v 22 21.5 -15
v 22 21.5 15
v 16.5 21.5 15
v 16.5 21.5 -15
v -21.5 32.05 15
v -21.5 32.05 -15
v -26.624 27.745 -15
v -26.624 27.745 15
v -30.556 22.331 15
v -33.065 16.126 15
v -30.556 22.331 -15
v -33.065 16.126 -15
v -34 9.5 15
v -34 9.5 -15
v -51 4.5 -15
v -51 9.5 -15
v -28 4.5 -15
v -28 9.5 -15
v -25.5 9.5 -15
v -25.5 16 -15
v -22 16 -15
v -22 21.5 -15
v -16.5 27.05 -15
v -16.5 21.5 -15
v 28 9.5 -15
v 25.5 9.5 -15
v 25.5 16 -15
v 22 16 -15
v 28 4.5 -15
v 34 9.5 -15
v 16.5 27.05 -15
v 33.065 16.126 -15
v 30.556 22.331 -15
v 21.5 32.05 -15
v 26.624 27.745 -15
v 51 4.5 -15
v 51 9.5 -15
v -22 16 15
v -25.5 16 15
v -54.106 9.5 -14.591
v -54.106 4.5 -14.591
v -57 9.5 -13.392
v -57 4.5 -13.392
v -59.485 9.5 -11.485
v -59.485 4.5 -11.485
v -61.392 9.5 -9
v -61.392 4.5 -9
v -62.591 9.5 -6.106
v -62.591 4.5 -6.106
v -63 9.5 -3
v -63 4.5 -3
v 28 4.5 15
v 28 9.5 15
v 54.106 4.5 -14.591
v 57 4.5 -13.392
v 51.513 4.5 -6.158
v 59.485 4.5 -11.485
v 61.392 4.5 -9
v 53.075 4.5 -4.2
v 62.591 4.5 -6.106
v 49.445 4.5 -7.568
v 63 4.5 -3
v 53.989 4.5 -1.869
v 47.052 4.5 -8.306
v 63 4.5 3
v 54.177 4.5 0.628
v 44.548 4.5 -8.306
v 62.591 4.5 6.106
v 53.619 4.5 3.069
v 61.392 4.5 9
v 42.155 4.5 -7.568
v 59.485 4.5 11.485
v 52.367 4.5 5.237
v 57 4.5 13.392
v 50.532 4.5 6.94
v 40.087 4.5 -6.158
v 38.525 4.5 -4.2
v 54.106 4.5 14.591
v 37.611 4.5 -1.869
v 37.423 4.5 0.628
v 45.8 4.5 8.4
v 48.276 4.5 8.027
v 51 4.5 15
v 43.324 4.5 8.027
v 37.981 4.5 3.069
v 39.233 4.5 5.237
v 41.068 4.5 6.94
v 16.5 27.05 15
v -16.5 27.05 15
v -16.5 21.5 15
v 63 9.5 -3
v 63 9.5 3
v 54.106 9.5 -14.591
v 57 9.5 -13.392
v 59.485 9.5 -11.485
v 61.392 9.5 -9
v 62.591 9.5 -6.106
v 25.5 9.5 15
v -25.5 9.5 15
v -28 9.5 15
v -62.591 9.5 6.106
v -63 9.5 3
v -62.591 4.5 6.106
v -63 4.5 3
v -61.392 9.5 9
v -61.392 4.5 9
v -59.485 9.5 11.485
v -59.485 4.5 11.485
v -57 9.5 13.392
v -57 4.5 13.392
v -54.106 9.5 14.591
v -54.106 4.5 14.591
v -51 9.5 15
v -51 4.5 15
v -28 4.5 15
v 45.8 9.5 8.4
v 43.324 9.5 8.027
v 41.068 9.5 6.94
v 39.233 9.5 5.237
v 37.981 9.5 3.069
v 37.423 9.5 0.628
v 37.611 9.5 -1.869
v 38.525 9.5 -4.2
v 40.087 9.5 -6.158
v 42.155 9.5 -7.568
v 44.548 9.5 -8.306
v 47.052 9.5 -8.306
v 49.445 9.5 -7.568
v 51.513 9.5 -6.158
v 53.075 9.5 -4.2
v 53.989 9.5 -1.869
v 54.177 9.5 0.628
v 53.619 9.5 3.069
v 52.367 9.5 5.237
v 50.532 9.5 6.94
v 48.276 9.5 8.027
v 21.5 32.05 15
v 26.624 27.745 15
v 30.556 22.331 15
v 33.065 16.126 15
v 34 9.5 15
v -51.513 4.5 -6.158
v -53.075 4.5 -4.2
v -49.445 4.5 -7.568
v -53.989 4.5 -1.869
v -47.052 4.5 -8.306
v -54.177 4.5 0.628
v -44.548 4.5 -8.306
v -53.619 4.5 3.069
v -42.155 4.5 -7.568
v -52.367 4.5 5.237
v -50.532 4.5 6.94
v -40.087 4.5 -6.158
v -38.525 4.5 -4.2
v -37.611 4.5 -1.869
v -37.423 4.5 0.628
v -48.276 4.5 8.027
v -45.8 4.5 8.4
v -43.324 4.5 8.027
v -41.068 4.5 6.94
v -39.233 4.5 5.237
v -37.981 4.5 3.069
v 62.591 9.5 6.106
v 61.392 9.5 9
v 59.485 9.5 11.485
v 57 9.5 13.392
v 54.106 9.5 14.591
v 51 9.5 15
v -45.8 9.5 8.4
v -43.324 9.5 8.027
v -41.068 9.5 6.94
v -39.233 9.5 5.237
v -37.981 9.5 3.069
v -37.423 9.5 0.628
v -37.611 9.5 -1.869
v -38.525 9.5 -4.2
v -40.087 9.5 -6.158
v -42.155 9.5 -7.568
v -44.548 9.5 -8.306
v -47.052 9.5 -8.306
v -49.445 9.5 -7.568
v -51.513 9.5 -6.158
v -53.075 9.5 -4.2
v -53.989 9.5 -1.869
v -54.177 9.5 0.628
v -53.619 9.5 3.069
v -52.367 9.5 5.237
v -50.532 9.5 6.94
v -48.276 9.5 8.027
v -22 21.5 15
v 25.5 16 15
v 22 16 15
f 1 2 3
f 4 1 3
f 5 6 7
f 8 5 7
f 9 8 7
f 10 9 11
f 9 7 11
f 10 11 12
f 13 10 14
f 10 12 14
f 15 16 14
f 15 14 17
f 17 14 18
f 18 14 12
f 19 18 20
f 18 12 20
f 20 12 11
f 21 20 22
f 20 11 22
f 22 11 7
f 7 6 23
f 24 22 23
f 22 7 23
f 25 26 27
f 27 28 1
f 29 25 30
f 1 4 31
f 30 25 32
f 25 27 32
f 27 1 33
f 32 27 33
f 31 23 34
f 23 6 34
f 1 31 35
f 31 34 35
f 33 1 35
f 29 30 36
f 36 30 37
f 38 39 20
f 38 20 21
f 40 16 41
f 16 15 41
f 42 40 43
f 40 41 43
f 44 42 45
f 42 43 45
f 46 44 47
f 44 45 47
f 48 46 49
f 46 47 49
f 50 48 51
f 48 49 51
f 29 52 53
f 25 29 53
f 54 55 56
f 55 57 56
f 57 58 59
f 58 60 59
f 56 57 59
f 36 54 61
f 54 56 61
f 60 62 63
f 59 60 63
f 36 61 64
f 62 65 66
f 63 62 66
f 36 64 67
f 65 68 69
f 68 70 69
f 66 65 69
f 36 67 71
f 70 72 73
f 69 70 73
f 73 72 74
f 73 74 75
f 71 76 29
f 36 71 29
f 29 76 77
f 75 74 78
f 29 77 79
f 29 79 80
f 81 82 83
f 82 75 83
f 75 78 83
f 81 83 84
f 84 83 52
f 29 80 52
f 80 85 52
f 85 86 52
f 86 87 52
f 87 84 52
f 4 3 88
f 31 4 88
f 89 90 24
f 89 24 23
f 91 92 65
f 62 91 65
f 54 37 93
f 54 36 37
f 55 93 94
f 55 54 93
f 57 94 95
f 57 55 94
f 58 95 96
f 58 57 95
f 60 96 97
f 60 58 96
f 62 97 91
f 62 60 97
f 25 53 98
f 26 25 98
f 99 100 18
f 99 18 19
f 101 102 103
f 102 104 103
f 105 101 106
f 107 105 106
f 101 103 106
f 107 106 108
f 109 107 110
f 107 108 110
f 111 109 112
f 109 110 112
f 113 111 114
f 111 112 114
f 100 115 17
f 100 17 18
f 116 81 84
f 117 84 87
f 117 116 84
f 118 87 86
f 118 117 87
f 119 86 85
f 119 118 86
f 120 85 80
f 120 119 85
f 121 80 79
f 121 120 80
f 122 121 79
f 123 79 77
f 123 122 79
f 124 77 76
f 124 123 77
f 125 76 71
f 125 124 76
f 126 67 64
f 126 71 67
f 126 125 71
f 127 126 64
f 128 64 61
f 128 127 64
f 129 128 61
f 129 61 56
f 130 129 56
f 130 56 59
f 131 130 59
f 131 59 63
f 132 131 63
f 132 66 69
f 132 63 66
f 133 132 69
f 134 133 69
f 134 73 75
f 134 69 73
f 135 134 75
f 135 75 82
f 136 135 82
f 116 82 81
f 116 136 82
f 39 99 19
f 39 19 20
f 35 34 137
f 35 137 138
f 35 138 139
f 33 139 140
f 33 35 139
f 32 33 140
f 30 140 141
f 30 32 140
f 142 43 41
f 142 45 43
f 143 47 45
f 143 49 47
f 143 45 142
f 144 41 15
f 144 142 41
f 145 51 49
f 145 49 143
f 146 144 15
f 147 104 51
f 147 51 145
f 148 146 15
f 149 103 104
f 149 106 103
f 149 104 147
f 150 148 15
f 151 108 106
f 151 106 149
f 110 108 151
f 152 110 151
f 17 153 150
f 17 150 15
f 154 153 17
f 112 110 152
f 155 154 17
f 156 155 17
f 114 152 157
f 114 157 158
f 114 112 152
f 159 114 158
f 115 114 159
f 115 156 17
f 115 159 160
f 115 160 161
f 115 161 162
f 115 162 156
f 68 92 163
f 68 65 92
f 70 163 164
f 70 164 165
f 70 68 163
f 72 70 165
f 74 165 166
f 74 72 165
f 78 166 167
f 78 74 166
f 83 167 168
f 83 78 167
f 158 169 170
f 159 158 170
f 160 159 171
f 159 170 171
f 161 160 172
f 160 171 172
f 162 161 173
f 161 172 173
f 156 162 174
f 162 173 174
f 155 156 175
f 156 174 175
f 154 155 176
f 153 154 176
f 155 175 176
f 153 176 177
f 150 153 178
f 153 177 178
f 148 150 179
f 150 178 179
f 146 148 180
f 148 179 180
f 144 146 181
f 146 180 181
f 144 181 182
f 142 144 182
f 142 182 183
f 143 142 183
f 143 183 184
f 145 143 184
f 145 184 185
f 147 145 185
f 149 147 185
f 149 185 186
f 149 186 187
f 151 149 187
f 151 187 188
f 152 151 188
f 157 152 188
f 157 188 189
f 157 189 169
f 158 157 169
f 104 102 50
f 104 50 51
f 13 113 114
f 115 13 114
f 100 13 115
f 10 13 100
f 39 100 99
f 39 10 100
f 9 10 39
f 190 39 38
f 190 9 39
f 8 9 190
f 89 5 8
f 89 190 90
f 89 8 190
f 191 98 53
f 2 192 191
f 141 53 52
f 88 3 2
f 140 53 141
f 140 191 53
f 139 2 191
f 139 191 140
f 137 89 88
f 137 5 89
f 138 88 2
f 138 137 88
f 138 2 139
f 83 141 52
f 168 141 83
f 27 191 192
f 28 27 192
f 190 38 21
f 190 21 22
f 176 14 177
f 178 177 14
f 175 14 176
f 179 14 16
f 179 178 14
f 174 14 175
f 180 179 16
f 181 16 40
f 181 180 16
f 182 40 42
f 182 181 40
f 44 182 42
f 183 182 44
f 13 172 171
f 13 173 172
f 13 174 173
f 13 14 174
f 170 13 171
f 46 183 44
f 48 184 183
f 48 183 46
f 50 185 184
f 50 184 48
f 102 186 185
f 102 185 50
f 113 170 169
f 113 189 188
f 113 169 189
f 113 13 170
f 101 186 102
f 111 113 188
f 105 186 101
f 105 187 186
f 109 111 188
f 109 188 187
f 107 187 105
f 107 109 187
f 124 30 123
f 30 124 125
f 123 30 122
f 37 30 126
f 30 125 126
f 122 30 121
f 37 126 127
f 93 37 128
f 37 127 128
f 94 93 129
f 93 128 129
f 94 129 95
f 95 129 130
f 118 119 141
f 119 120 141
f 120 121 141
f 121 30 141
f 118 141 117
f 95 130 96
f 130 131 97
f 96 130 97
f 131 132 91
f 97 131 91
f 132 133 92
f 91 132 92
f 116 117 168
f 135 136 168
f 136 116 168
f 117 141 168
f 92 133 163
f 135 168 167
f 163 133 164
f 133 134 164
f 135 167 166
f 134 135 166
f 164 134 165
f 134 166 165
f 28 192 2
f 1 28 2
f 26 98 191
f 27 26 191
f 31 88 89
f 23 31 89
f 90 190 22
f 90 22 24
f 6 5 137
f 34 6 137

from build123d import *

# Parameters (mm, degrees)
EXTRUDE_THIN1_DEPTH  = 15
SKETCH2_R            = 8.4
CUT_EXTRUDE1_DEPTH   = 69.574794932
FILLET1_R            = 12
FILLET1_OF_MIRROR1_R = 12
BOSS_EXTRUDE1_DEPTH  = 30


with BuildPart() as part:
    # Sketch1 → Extrude-Thin1 (new, symmetric)
    with BuildSketch(Plane.XY):
        Polygon((-63, 4.5), (-28, 4.5), (-28, 9.5), (-25.5, 9.5), (-25.5, 16), (-22, 16), (-22, 21.5), (-16.5, 21.5), (-16.5, 27.05), (0, 27.05), (0, 32.05), (-21.5, 32.05), (-21.5, 26.5), (-27, 26.5), (-27, 21), (-30.5, 21), (-30.5, 14.5), (-33, 14.5), (-33, 9.5), (-63, 9.5), align=None)
    extrude_thin1 = extrude(amount=EXTRUDE_THIN1_DEPTH, both=True)

    # Sketch2 → Cut-Extrude1 (cut, through all)
    with BuildSketch(Plane(origin=(0, 9.5, 0), x_dir=(1, 0, 0), z_dir=(0, 1, 0))):
        with Locations(Location((-45.8, 0, 0), (0, 0, 270))):
            Circle(SKETCH2_R)
    cut_extrude1 = extrude(amount=-CUT_EXTRUDE1_DEPTH, mode=Mode.SUBTRACT)

    # Fillet1
    fillet1_edges = [part.edges().sort_by_distance(p)[0] for p in [
        (-63, 7, -15),
        (-63, 7, 15),
    ]]
    fillet(fillet1_edges, radius=FILLET1_R)

    # Mirror1: Extrude-Thin1, Cut-Extrude1 across plane
    add(extrude_thin1.mirror(Plane(origin=(0, 32.05, 15), x_dir=(0, 0, 1), z_dir=(1, 0, 0))))
    add(cut_extrude1.mirror(Plane(origin=(0, 32.05, 15), x_dir=(0, 0, 1), z_dir=(1, 0, 0))), mode=Mode.SUBTRACT)

    # Fillet1 of Mirror1
    fillet1_of_mirror1_edges = [part.edges().sort_by_distance(p)[0] for p in [
        (63, 7, -15),
        (63, 7, 15),
    ]]
    fillet(fillet1_of_mirror1_edges, radius=FILLET1_OF_MIRROR1_R)

    # Sketch4 → Boss-Extrude1 (add)
    with BuildSketch(Plane(origin=(0, 0, -15), x_dir=(-1, 0, 0), z_dir=(0, 0, -1))):
        with BuildLine():
            Line((-34, 9.5), (-33, 9.5))
            Line((-33, 9.5), (-33, 14.5))
            Line((-33, 14.5), (-30.5, 14.5))
            Line((-30.5, 14.5), (-30.5, 21))
            Line((-30.5, 21), (-27, 21))
            Line((-27, 21), (-27, 26.5))
            Line((-27, 26.5), (-21.5, 26.5))
            Line((-21.5, 26.5), (-21.5, 32.05))
            ThreePointArc((-21.5, 32.05), (-30.55647166, 22.330693825), (-34, 9.5))
        make_face()
    boss_extrude1 = extrude(amount=-BOSS_EXTRUDE1_DEPTH)

    # Mirror2: Boss-Extrude1 across plane
    add(boss_extrude1.mirror(Plane(origin=(0, 0, 0), x_dir=(0, 0, 1), z_dir=(1, 0, 0))))


solid = part.part
